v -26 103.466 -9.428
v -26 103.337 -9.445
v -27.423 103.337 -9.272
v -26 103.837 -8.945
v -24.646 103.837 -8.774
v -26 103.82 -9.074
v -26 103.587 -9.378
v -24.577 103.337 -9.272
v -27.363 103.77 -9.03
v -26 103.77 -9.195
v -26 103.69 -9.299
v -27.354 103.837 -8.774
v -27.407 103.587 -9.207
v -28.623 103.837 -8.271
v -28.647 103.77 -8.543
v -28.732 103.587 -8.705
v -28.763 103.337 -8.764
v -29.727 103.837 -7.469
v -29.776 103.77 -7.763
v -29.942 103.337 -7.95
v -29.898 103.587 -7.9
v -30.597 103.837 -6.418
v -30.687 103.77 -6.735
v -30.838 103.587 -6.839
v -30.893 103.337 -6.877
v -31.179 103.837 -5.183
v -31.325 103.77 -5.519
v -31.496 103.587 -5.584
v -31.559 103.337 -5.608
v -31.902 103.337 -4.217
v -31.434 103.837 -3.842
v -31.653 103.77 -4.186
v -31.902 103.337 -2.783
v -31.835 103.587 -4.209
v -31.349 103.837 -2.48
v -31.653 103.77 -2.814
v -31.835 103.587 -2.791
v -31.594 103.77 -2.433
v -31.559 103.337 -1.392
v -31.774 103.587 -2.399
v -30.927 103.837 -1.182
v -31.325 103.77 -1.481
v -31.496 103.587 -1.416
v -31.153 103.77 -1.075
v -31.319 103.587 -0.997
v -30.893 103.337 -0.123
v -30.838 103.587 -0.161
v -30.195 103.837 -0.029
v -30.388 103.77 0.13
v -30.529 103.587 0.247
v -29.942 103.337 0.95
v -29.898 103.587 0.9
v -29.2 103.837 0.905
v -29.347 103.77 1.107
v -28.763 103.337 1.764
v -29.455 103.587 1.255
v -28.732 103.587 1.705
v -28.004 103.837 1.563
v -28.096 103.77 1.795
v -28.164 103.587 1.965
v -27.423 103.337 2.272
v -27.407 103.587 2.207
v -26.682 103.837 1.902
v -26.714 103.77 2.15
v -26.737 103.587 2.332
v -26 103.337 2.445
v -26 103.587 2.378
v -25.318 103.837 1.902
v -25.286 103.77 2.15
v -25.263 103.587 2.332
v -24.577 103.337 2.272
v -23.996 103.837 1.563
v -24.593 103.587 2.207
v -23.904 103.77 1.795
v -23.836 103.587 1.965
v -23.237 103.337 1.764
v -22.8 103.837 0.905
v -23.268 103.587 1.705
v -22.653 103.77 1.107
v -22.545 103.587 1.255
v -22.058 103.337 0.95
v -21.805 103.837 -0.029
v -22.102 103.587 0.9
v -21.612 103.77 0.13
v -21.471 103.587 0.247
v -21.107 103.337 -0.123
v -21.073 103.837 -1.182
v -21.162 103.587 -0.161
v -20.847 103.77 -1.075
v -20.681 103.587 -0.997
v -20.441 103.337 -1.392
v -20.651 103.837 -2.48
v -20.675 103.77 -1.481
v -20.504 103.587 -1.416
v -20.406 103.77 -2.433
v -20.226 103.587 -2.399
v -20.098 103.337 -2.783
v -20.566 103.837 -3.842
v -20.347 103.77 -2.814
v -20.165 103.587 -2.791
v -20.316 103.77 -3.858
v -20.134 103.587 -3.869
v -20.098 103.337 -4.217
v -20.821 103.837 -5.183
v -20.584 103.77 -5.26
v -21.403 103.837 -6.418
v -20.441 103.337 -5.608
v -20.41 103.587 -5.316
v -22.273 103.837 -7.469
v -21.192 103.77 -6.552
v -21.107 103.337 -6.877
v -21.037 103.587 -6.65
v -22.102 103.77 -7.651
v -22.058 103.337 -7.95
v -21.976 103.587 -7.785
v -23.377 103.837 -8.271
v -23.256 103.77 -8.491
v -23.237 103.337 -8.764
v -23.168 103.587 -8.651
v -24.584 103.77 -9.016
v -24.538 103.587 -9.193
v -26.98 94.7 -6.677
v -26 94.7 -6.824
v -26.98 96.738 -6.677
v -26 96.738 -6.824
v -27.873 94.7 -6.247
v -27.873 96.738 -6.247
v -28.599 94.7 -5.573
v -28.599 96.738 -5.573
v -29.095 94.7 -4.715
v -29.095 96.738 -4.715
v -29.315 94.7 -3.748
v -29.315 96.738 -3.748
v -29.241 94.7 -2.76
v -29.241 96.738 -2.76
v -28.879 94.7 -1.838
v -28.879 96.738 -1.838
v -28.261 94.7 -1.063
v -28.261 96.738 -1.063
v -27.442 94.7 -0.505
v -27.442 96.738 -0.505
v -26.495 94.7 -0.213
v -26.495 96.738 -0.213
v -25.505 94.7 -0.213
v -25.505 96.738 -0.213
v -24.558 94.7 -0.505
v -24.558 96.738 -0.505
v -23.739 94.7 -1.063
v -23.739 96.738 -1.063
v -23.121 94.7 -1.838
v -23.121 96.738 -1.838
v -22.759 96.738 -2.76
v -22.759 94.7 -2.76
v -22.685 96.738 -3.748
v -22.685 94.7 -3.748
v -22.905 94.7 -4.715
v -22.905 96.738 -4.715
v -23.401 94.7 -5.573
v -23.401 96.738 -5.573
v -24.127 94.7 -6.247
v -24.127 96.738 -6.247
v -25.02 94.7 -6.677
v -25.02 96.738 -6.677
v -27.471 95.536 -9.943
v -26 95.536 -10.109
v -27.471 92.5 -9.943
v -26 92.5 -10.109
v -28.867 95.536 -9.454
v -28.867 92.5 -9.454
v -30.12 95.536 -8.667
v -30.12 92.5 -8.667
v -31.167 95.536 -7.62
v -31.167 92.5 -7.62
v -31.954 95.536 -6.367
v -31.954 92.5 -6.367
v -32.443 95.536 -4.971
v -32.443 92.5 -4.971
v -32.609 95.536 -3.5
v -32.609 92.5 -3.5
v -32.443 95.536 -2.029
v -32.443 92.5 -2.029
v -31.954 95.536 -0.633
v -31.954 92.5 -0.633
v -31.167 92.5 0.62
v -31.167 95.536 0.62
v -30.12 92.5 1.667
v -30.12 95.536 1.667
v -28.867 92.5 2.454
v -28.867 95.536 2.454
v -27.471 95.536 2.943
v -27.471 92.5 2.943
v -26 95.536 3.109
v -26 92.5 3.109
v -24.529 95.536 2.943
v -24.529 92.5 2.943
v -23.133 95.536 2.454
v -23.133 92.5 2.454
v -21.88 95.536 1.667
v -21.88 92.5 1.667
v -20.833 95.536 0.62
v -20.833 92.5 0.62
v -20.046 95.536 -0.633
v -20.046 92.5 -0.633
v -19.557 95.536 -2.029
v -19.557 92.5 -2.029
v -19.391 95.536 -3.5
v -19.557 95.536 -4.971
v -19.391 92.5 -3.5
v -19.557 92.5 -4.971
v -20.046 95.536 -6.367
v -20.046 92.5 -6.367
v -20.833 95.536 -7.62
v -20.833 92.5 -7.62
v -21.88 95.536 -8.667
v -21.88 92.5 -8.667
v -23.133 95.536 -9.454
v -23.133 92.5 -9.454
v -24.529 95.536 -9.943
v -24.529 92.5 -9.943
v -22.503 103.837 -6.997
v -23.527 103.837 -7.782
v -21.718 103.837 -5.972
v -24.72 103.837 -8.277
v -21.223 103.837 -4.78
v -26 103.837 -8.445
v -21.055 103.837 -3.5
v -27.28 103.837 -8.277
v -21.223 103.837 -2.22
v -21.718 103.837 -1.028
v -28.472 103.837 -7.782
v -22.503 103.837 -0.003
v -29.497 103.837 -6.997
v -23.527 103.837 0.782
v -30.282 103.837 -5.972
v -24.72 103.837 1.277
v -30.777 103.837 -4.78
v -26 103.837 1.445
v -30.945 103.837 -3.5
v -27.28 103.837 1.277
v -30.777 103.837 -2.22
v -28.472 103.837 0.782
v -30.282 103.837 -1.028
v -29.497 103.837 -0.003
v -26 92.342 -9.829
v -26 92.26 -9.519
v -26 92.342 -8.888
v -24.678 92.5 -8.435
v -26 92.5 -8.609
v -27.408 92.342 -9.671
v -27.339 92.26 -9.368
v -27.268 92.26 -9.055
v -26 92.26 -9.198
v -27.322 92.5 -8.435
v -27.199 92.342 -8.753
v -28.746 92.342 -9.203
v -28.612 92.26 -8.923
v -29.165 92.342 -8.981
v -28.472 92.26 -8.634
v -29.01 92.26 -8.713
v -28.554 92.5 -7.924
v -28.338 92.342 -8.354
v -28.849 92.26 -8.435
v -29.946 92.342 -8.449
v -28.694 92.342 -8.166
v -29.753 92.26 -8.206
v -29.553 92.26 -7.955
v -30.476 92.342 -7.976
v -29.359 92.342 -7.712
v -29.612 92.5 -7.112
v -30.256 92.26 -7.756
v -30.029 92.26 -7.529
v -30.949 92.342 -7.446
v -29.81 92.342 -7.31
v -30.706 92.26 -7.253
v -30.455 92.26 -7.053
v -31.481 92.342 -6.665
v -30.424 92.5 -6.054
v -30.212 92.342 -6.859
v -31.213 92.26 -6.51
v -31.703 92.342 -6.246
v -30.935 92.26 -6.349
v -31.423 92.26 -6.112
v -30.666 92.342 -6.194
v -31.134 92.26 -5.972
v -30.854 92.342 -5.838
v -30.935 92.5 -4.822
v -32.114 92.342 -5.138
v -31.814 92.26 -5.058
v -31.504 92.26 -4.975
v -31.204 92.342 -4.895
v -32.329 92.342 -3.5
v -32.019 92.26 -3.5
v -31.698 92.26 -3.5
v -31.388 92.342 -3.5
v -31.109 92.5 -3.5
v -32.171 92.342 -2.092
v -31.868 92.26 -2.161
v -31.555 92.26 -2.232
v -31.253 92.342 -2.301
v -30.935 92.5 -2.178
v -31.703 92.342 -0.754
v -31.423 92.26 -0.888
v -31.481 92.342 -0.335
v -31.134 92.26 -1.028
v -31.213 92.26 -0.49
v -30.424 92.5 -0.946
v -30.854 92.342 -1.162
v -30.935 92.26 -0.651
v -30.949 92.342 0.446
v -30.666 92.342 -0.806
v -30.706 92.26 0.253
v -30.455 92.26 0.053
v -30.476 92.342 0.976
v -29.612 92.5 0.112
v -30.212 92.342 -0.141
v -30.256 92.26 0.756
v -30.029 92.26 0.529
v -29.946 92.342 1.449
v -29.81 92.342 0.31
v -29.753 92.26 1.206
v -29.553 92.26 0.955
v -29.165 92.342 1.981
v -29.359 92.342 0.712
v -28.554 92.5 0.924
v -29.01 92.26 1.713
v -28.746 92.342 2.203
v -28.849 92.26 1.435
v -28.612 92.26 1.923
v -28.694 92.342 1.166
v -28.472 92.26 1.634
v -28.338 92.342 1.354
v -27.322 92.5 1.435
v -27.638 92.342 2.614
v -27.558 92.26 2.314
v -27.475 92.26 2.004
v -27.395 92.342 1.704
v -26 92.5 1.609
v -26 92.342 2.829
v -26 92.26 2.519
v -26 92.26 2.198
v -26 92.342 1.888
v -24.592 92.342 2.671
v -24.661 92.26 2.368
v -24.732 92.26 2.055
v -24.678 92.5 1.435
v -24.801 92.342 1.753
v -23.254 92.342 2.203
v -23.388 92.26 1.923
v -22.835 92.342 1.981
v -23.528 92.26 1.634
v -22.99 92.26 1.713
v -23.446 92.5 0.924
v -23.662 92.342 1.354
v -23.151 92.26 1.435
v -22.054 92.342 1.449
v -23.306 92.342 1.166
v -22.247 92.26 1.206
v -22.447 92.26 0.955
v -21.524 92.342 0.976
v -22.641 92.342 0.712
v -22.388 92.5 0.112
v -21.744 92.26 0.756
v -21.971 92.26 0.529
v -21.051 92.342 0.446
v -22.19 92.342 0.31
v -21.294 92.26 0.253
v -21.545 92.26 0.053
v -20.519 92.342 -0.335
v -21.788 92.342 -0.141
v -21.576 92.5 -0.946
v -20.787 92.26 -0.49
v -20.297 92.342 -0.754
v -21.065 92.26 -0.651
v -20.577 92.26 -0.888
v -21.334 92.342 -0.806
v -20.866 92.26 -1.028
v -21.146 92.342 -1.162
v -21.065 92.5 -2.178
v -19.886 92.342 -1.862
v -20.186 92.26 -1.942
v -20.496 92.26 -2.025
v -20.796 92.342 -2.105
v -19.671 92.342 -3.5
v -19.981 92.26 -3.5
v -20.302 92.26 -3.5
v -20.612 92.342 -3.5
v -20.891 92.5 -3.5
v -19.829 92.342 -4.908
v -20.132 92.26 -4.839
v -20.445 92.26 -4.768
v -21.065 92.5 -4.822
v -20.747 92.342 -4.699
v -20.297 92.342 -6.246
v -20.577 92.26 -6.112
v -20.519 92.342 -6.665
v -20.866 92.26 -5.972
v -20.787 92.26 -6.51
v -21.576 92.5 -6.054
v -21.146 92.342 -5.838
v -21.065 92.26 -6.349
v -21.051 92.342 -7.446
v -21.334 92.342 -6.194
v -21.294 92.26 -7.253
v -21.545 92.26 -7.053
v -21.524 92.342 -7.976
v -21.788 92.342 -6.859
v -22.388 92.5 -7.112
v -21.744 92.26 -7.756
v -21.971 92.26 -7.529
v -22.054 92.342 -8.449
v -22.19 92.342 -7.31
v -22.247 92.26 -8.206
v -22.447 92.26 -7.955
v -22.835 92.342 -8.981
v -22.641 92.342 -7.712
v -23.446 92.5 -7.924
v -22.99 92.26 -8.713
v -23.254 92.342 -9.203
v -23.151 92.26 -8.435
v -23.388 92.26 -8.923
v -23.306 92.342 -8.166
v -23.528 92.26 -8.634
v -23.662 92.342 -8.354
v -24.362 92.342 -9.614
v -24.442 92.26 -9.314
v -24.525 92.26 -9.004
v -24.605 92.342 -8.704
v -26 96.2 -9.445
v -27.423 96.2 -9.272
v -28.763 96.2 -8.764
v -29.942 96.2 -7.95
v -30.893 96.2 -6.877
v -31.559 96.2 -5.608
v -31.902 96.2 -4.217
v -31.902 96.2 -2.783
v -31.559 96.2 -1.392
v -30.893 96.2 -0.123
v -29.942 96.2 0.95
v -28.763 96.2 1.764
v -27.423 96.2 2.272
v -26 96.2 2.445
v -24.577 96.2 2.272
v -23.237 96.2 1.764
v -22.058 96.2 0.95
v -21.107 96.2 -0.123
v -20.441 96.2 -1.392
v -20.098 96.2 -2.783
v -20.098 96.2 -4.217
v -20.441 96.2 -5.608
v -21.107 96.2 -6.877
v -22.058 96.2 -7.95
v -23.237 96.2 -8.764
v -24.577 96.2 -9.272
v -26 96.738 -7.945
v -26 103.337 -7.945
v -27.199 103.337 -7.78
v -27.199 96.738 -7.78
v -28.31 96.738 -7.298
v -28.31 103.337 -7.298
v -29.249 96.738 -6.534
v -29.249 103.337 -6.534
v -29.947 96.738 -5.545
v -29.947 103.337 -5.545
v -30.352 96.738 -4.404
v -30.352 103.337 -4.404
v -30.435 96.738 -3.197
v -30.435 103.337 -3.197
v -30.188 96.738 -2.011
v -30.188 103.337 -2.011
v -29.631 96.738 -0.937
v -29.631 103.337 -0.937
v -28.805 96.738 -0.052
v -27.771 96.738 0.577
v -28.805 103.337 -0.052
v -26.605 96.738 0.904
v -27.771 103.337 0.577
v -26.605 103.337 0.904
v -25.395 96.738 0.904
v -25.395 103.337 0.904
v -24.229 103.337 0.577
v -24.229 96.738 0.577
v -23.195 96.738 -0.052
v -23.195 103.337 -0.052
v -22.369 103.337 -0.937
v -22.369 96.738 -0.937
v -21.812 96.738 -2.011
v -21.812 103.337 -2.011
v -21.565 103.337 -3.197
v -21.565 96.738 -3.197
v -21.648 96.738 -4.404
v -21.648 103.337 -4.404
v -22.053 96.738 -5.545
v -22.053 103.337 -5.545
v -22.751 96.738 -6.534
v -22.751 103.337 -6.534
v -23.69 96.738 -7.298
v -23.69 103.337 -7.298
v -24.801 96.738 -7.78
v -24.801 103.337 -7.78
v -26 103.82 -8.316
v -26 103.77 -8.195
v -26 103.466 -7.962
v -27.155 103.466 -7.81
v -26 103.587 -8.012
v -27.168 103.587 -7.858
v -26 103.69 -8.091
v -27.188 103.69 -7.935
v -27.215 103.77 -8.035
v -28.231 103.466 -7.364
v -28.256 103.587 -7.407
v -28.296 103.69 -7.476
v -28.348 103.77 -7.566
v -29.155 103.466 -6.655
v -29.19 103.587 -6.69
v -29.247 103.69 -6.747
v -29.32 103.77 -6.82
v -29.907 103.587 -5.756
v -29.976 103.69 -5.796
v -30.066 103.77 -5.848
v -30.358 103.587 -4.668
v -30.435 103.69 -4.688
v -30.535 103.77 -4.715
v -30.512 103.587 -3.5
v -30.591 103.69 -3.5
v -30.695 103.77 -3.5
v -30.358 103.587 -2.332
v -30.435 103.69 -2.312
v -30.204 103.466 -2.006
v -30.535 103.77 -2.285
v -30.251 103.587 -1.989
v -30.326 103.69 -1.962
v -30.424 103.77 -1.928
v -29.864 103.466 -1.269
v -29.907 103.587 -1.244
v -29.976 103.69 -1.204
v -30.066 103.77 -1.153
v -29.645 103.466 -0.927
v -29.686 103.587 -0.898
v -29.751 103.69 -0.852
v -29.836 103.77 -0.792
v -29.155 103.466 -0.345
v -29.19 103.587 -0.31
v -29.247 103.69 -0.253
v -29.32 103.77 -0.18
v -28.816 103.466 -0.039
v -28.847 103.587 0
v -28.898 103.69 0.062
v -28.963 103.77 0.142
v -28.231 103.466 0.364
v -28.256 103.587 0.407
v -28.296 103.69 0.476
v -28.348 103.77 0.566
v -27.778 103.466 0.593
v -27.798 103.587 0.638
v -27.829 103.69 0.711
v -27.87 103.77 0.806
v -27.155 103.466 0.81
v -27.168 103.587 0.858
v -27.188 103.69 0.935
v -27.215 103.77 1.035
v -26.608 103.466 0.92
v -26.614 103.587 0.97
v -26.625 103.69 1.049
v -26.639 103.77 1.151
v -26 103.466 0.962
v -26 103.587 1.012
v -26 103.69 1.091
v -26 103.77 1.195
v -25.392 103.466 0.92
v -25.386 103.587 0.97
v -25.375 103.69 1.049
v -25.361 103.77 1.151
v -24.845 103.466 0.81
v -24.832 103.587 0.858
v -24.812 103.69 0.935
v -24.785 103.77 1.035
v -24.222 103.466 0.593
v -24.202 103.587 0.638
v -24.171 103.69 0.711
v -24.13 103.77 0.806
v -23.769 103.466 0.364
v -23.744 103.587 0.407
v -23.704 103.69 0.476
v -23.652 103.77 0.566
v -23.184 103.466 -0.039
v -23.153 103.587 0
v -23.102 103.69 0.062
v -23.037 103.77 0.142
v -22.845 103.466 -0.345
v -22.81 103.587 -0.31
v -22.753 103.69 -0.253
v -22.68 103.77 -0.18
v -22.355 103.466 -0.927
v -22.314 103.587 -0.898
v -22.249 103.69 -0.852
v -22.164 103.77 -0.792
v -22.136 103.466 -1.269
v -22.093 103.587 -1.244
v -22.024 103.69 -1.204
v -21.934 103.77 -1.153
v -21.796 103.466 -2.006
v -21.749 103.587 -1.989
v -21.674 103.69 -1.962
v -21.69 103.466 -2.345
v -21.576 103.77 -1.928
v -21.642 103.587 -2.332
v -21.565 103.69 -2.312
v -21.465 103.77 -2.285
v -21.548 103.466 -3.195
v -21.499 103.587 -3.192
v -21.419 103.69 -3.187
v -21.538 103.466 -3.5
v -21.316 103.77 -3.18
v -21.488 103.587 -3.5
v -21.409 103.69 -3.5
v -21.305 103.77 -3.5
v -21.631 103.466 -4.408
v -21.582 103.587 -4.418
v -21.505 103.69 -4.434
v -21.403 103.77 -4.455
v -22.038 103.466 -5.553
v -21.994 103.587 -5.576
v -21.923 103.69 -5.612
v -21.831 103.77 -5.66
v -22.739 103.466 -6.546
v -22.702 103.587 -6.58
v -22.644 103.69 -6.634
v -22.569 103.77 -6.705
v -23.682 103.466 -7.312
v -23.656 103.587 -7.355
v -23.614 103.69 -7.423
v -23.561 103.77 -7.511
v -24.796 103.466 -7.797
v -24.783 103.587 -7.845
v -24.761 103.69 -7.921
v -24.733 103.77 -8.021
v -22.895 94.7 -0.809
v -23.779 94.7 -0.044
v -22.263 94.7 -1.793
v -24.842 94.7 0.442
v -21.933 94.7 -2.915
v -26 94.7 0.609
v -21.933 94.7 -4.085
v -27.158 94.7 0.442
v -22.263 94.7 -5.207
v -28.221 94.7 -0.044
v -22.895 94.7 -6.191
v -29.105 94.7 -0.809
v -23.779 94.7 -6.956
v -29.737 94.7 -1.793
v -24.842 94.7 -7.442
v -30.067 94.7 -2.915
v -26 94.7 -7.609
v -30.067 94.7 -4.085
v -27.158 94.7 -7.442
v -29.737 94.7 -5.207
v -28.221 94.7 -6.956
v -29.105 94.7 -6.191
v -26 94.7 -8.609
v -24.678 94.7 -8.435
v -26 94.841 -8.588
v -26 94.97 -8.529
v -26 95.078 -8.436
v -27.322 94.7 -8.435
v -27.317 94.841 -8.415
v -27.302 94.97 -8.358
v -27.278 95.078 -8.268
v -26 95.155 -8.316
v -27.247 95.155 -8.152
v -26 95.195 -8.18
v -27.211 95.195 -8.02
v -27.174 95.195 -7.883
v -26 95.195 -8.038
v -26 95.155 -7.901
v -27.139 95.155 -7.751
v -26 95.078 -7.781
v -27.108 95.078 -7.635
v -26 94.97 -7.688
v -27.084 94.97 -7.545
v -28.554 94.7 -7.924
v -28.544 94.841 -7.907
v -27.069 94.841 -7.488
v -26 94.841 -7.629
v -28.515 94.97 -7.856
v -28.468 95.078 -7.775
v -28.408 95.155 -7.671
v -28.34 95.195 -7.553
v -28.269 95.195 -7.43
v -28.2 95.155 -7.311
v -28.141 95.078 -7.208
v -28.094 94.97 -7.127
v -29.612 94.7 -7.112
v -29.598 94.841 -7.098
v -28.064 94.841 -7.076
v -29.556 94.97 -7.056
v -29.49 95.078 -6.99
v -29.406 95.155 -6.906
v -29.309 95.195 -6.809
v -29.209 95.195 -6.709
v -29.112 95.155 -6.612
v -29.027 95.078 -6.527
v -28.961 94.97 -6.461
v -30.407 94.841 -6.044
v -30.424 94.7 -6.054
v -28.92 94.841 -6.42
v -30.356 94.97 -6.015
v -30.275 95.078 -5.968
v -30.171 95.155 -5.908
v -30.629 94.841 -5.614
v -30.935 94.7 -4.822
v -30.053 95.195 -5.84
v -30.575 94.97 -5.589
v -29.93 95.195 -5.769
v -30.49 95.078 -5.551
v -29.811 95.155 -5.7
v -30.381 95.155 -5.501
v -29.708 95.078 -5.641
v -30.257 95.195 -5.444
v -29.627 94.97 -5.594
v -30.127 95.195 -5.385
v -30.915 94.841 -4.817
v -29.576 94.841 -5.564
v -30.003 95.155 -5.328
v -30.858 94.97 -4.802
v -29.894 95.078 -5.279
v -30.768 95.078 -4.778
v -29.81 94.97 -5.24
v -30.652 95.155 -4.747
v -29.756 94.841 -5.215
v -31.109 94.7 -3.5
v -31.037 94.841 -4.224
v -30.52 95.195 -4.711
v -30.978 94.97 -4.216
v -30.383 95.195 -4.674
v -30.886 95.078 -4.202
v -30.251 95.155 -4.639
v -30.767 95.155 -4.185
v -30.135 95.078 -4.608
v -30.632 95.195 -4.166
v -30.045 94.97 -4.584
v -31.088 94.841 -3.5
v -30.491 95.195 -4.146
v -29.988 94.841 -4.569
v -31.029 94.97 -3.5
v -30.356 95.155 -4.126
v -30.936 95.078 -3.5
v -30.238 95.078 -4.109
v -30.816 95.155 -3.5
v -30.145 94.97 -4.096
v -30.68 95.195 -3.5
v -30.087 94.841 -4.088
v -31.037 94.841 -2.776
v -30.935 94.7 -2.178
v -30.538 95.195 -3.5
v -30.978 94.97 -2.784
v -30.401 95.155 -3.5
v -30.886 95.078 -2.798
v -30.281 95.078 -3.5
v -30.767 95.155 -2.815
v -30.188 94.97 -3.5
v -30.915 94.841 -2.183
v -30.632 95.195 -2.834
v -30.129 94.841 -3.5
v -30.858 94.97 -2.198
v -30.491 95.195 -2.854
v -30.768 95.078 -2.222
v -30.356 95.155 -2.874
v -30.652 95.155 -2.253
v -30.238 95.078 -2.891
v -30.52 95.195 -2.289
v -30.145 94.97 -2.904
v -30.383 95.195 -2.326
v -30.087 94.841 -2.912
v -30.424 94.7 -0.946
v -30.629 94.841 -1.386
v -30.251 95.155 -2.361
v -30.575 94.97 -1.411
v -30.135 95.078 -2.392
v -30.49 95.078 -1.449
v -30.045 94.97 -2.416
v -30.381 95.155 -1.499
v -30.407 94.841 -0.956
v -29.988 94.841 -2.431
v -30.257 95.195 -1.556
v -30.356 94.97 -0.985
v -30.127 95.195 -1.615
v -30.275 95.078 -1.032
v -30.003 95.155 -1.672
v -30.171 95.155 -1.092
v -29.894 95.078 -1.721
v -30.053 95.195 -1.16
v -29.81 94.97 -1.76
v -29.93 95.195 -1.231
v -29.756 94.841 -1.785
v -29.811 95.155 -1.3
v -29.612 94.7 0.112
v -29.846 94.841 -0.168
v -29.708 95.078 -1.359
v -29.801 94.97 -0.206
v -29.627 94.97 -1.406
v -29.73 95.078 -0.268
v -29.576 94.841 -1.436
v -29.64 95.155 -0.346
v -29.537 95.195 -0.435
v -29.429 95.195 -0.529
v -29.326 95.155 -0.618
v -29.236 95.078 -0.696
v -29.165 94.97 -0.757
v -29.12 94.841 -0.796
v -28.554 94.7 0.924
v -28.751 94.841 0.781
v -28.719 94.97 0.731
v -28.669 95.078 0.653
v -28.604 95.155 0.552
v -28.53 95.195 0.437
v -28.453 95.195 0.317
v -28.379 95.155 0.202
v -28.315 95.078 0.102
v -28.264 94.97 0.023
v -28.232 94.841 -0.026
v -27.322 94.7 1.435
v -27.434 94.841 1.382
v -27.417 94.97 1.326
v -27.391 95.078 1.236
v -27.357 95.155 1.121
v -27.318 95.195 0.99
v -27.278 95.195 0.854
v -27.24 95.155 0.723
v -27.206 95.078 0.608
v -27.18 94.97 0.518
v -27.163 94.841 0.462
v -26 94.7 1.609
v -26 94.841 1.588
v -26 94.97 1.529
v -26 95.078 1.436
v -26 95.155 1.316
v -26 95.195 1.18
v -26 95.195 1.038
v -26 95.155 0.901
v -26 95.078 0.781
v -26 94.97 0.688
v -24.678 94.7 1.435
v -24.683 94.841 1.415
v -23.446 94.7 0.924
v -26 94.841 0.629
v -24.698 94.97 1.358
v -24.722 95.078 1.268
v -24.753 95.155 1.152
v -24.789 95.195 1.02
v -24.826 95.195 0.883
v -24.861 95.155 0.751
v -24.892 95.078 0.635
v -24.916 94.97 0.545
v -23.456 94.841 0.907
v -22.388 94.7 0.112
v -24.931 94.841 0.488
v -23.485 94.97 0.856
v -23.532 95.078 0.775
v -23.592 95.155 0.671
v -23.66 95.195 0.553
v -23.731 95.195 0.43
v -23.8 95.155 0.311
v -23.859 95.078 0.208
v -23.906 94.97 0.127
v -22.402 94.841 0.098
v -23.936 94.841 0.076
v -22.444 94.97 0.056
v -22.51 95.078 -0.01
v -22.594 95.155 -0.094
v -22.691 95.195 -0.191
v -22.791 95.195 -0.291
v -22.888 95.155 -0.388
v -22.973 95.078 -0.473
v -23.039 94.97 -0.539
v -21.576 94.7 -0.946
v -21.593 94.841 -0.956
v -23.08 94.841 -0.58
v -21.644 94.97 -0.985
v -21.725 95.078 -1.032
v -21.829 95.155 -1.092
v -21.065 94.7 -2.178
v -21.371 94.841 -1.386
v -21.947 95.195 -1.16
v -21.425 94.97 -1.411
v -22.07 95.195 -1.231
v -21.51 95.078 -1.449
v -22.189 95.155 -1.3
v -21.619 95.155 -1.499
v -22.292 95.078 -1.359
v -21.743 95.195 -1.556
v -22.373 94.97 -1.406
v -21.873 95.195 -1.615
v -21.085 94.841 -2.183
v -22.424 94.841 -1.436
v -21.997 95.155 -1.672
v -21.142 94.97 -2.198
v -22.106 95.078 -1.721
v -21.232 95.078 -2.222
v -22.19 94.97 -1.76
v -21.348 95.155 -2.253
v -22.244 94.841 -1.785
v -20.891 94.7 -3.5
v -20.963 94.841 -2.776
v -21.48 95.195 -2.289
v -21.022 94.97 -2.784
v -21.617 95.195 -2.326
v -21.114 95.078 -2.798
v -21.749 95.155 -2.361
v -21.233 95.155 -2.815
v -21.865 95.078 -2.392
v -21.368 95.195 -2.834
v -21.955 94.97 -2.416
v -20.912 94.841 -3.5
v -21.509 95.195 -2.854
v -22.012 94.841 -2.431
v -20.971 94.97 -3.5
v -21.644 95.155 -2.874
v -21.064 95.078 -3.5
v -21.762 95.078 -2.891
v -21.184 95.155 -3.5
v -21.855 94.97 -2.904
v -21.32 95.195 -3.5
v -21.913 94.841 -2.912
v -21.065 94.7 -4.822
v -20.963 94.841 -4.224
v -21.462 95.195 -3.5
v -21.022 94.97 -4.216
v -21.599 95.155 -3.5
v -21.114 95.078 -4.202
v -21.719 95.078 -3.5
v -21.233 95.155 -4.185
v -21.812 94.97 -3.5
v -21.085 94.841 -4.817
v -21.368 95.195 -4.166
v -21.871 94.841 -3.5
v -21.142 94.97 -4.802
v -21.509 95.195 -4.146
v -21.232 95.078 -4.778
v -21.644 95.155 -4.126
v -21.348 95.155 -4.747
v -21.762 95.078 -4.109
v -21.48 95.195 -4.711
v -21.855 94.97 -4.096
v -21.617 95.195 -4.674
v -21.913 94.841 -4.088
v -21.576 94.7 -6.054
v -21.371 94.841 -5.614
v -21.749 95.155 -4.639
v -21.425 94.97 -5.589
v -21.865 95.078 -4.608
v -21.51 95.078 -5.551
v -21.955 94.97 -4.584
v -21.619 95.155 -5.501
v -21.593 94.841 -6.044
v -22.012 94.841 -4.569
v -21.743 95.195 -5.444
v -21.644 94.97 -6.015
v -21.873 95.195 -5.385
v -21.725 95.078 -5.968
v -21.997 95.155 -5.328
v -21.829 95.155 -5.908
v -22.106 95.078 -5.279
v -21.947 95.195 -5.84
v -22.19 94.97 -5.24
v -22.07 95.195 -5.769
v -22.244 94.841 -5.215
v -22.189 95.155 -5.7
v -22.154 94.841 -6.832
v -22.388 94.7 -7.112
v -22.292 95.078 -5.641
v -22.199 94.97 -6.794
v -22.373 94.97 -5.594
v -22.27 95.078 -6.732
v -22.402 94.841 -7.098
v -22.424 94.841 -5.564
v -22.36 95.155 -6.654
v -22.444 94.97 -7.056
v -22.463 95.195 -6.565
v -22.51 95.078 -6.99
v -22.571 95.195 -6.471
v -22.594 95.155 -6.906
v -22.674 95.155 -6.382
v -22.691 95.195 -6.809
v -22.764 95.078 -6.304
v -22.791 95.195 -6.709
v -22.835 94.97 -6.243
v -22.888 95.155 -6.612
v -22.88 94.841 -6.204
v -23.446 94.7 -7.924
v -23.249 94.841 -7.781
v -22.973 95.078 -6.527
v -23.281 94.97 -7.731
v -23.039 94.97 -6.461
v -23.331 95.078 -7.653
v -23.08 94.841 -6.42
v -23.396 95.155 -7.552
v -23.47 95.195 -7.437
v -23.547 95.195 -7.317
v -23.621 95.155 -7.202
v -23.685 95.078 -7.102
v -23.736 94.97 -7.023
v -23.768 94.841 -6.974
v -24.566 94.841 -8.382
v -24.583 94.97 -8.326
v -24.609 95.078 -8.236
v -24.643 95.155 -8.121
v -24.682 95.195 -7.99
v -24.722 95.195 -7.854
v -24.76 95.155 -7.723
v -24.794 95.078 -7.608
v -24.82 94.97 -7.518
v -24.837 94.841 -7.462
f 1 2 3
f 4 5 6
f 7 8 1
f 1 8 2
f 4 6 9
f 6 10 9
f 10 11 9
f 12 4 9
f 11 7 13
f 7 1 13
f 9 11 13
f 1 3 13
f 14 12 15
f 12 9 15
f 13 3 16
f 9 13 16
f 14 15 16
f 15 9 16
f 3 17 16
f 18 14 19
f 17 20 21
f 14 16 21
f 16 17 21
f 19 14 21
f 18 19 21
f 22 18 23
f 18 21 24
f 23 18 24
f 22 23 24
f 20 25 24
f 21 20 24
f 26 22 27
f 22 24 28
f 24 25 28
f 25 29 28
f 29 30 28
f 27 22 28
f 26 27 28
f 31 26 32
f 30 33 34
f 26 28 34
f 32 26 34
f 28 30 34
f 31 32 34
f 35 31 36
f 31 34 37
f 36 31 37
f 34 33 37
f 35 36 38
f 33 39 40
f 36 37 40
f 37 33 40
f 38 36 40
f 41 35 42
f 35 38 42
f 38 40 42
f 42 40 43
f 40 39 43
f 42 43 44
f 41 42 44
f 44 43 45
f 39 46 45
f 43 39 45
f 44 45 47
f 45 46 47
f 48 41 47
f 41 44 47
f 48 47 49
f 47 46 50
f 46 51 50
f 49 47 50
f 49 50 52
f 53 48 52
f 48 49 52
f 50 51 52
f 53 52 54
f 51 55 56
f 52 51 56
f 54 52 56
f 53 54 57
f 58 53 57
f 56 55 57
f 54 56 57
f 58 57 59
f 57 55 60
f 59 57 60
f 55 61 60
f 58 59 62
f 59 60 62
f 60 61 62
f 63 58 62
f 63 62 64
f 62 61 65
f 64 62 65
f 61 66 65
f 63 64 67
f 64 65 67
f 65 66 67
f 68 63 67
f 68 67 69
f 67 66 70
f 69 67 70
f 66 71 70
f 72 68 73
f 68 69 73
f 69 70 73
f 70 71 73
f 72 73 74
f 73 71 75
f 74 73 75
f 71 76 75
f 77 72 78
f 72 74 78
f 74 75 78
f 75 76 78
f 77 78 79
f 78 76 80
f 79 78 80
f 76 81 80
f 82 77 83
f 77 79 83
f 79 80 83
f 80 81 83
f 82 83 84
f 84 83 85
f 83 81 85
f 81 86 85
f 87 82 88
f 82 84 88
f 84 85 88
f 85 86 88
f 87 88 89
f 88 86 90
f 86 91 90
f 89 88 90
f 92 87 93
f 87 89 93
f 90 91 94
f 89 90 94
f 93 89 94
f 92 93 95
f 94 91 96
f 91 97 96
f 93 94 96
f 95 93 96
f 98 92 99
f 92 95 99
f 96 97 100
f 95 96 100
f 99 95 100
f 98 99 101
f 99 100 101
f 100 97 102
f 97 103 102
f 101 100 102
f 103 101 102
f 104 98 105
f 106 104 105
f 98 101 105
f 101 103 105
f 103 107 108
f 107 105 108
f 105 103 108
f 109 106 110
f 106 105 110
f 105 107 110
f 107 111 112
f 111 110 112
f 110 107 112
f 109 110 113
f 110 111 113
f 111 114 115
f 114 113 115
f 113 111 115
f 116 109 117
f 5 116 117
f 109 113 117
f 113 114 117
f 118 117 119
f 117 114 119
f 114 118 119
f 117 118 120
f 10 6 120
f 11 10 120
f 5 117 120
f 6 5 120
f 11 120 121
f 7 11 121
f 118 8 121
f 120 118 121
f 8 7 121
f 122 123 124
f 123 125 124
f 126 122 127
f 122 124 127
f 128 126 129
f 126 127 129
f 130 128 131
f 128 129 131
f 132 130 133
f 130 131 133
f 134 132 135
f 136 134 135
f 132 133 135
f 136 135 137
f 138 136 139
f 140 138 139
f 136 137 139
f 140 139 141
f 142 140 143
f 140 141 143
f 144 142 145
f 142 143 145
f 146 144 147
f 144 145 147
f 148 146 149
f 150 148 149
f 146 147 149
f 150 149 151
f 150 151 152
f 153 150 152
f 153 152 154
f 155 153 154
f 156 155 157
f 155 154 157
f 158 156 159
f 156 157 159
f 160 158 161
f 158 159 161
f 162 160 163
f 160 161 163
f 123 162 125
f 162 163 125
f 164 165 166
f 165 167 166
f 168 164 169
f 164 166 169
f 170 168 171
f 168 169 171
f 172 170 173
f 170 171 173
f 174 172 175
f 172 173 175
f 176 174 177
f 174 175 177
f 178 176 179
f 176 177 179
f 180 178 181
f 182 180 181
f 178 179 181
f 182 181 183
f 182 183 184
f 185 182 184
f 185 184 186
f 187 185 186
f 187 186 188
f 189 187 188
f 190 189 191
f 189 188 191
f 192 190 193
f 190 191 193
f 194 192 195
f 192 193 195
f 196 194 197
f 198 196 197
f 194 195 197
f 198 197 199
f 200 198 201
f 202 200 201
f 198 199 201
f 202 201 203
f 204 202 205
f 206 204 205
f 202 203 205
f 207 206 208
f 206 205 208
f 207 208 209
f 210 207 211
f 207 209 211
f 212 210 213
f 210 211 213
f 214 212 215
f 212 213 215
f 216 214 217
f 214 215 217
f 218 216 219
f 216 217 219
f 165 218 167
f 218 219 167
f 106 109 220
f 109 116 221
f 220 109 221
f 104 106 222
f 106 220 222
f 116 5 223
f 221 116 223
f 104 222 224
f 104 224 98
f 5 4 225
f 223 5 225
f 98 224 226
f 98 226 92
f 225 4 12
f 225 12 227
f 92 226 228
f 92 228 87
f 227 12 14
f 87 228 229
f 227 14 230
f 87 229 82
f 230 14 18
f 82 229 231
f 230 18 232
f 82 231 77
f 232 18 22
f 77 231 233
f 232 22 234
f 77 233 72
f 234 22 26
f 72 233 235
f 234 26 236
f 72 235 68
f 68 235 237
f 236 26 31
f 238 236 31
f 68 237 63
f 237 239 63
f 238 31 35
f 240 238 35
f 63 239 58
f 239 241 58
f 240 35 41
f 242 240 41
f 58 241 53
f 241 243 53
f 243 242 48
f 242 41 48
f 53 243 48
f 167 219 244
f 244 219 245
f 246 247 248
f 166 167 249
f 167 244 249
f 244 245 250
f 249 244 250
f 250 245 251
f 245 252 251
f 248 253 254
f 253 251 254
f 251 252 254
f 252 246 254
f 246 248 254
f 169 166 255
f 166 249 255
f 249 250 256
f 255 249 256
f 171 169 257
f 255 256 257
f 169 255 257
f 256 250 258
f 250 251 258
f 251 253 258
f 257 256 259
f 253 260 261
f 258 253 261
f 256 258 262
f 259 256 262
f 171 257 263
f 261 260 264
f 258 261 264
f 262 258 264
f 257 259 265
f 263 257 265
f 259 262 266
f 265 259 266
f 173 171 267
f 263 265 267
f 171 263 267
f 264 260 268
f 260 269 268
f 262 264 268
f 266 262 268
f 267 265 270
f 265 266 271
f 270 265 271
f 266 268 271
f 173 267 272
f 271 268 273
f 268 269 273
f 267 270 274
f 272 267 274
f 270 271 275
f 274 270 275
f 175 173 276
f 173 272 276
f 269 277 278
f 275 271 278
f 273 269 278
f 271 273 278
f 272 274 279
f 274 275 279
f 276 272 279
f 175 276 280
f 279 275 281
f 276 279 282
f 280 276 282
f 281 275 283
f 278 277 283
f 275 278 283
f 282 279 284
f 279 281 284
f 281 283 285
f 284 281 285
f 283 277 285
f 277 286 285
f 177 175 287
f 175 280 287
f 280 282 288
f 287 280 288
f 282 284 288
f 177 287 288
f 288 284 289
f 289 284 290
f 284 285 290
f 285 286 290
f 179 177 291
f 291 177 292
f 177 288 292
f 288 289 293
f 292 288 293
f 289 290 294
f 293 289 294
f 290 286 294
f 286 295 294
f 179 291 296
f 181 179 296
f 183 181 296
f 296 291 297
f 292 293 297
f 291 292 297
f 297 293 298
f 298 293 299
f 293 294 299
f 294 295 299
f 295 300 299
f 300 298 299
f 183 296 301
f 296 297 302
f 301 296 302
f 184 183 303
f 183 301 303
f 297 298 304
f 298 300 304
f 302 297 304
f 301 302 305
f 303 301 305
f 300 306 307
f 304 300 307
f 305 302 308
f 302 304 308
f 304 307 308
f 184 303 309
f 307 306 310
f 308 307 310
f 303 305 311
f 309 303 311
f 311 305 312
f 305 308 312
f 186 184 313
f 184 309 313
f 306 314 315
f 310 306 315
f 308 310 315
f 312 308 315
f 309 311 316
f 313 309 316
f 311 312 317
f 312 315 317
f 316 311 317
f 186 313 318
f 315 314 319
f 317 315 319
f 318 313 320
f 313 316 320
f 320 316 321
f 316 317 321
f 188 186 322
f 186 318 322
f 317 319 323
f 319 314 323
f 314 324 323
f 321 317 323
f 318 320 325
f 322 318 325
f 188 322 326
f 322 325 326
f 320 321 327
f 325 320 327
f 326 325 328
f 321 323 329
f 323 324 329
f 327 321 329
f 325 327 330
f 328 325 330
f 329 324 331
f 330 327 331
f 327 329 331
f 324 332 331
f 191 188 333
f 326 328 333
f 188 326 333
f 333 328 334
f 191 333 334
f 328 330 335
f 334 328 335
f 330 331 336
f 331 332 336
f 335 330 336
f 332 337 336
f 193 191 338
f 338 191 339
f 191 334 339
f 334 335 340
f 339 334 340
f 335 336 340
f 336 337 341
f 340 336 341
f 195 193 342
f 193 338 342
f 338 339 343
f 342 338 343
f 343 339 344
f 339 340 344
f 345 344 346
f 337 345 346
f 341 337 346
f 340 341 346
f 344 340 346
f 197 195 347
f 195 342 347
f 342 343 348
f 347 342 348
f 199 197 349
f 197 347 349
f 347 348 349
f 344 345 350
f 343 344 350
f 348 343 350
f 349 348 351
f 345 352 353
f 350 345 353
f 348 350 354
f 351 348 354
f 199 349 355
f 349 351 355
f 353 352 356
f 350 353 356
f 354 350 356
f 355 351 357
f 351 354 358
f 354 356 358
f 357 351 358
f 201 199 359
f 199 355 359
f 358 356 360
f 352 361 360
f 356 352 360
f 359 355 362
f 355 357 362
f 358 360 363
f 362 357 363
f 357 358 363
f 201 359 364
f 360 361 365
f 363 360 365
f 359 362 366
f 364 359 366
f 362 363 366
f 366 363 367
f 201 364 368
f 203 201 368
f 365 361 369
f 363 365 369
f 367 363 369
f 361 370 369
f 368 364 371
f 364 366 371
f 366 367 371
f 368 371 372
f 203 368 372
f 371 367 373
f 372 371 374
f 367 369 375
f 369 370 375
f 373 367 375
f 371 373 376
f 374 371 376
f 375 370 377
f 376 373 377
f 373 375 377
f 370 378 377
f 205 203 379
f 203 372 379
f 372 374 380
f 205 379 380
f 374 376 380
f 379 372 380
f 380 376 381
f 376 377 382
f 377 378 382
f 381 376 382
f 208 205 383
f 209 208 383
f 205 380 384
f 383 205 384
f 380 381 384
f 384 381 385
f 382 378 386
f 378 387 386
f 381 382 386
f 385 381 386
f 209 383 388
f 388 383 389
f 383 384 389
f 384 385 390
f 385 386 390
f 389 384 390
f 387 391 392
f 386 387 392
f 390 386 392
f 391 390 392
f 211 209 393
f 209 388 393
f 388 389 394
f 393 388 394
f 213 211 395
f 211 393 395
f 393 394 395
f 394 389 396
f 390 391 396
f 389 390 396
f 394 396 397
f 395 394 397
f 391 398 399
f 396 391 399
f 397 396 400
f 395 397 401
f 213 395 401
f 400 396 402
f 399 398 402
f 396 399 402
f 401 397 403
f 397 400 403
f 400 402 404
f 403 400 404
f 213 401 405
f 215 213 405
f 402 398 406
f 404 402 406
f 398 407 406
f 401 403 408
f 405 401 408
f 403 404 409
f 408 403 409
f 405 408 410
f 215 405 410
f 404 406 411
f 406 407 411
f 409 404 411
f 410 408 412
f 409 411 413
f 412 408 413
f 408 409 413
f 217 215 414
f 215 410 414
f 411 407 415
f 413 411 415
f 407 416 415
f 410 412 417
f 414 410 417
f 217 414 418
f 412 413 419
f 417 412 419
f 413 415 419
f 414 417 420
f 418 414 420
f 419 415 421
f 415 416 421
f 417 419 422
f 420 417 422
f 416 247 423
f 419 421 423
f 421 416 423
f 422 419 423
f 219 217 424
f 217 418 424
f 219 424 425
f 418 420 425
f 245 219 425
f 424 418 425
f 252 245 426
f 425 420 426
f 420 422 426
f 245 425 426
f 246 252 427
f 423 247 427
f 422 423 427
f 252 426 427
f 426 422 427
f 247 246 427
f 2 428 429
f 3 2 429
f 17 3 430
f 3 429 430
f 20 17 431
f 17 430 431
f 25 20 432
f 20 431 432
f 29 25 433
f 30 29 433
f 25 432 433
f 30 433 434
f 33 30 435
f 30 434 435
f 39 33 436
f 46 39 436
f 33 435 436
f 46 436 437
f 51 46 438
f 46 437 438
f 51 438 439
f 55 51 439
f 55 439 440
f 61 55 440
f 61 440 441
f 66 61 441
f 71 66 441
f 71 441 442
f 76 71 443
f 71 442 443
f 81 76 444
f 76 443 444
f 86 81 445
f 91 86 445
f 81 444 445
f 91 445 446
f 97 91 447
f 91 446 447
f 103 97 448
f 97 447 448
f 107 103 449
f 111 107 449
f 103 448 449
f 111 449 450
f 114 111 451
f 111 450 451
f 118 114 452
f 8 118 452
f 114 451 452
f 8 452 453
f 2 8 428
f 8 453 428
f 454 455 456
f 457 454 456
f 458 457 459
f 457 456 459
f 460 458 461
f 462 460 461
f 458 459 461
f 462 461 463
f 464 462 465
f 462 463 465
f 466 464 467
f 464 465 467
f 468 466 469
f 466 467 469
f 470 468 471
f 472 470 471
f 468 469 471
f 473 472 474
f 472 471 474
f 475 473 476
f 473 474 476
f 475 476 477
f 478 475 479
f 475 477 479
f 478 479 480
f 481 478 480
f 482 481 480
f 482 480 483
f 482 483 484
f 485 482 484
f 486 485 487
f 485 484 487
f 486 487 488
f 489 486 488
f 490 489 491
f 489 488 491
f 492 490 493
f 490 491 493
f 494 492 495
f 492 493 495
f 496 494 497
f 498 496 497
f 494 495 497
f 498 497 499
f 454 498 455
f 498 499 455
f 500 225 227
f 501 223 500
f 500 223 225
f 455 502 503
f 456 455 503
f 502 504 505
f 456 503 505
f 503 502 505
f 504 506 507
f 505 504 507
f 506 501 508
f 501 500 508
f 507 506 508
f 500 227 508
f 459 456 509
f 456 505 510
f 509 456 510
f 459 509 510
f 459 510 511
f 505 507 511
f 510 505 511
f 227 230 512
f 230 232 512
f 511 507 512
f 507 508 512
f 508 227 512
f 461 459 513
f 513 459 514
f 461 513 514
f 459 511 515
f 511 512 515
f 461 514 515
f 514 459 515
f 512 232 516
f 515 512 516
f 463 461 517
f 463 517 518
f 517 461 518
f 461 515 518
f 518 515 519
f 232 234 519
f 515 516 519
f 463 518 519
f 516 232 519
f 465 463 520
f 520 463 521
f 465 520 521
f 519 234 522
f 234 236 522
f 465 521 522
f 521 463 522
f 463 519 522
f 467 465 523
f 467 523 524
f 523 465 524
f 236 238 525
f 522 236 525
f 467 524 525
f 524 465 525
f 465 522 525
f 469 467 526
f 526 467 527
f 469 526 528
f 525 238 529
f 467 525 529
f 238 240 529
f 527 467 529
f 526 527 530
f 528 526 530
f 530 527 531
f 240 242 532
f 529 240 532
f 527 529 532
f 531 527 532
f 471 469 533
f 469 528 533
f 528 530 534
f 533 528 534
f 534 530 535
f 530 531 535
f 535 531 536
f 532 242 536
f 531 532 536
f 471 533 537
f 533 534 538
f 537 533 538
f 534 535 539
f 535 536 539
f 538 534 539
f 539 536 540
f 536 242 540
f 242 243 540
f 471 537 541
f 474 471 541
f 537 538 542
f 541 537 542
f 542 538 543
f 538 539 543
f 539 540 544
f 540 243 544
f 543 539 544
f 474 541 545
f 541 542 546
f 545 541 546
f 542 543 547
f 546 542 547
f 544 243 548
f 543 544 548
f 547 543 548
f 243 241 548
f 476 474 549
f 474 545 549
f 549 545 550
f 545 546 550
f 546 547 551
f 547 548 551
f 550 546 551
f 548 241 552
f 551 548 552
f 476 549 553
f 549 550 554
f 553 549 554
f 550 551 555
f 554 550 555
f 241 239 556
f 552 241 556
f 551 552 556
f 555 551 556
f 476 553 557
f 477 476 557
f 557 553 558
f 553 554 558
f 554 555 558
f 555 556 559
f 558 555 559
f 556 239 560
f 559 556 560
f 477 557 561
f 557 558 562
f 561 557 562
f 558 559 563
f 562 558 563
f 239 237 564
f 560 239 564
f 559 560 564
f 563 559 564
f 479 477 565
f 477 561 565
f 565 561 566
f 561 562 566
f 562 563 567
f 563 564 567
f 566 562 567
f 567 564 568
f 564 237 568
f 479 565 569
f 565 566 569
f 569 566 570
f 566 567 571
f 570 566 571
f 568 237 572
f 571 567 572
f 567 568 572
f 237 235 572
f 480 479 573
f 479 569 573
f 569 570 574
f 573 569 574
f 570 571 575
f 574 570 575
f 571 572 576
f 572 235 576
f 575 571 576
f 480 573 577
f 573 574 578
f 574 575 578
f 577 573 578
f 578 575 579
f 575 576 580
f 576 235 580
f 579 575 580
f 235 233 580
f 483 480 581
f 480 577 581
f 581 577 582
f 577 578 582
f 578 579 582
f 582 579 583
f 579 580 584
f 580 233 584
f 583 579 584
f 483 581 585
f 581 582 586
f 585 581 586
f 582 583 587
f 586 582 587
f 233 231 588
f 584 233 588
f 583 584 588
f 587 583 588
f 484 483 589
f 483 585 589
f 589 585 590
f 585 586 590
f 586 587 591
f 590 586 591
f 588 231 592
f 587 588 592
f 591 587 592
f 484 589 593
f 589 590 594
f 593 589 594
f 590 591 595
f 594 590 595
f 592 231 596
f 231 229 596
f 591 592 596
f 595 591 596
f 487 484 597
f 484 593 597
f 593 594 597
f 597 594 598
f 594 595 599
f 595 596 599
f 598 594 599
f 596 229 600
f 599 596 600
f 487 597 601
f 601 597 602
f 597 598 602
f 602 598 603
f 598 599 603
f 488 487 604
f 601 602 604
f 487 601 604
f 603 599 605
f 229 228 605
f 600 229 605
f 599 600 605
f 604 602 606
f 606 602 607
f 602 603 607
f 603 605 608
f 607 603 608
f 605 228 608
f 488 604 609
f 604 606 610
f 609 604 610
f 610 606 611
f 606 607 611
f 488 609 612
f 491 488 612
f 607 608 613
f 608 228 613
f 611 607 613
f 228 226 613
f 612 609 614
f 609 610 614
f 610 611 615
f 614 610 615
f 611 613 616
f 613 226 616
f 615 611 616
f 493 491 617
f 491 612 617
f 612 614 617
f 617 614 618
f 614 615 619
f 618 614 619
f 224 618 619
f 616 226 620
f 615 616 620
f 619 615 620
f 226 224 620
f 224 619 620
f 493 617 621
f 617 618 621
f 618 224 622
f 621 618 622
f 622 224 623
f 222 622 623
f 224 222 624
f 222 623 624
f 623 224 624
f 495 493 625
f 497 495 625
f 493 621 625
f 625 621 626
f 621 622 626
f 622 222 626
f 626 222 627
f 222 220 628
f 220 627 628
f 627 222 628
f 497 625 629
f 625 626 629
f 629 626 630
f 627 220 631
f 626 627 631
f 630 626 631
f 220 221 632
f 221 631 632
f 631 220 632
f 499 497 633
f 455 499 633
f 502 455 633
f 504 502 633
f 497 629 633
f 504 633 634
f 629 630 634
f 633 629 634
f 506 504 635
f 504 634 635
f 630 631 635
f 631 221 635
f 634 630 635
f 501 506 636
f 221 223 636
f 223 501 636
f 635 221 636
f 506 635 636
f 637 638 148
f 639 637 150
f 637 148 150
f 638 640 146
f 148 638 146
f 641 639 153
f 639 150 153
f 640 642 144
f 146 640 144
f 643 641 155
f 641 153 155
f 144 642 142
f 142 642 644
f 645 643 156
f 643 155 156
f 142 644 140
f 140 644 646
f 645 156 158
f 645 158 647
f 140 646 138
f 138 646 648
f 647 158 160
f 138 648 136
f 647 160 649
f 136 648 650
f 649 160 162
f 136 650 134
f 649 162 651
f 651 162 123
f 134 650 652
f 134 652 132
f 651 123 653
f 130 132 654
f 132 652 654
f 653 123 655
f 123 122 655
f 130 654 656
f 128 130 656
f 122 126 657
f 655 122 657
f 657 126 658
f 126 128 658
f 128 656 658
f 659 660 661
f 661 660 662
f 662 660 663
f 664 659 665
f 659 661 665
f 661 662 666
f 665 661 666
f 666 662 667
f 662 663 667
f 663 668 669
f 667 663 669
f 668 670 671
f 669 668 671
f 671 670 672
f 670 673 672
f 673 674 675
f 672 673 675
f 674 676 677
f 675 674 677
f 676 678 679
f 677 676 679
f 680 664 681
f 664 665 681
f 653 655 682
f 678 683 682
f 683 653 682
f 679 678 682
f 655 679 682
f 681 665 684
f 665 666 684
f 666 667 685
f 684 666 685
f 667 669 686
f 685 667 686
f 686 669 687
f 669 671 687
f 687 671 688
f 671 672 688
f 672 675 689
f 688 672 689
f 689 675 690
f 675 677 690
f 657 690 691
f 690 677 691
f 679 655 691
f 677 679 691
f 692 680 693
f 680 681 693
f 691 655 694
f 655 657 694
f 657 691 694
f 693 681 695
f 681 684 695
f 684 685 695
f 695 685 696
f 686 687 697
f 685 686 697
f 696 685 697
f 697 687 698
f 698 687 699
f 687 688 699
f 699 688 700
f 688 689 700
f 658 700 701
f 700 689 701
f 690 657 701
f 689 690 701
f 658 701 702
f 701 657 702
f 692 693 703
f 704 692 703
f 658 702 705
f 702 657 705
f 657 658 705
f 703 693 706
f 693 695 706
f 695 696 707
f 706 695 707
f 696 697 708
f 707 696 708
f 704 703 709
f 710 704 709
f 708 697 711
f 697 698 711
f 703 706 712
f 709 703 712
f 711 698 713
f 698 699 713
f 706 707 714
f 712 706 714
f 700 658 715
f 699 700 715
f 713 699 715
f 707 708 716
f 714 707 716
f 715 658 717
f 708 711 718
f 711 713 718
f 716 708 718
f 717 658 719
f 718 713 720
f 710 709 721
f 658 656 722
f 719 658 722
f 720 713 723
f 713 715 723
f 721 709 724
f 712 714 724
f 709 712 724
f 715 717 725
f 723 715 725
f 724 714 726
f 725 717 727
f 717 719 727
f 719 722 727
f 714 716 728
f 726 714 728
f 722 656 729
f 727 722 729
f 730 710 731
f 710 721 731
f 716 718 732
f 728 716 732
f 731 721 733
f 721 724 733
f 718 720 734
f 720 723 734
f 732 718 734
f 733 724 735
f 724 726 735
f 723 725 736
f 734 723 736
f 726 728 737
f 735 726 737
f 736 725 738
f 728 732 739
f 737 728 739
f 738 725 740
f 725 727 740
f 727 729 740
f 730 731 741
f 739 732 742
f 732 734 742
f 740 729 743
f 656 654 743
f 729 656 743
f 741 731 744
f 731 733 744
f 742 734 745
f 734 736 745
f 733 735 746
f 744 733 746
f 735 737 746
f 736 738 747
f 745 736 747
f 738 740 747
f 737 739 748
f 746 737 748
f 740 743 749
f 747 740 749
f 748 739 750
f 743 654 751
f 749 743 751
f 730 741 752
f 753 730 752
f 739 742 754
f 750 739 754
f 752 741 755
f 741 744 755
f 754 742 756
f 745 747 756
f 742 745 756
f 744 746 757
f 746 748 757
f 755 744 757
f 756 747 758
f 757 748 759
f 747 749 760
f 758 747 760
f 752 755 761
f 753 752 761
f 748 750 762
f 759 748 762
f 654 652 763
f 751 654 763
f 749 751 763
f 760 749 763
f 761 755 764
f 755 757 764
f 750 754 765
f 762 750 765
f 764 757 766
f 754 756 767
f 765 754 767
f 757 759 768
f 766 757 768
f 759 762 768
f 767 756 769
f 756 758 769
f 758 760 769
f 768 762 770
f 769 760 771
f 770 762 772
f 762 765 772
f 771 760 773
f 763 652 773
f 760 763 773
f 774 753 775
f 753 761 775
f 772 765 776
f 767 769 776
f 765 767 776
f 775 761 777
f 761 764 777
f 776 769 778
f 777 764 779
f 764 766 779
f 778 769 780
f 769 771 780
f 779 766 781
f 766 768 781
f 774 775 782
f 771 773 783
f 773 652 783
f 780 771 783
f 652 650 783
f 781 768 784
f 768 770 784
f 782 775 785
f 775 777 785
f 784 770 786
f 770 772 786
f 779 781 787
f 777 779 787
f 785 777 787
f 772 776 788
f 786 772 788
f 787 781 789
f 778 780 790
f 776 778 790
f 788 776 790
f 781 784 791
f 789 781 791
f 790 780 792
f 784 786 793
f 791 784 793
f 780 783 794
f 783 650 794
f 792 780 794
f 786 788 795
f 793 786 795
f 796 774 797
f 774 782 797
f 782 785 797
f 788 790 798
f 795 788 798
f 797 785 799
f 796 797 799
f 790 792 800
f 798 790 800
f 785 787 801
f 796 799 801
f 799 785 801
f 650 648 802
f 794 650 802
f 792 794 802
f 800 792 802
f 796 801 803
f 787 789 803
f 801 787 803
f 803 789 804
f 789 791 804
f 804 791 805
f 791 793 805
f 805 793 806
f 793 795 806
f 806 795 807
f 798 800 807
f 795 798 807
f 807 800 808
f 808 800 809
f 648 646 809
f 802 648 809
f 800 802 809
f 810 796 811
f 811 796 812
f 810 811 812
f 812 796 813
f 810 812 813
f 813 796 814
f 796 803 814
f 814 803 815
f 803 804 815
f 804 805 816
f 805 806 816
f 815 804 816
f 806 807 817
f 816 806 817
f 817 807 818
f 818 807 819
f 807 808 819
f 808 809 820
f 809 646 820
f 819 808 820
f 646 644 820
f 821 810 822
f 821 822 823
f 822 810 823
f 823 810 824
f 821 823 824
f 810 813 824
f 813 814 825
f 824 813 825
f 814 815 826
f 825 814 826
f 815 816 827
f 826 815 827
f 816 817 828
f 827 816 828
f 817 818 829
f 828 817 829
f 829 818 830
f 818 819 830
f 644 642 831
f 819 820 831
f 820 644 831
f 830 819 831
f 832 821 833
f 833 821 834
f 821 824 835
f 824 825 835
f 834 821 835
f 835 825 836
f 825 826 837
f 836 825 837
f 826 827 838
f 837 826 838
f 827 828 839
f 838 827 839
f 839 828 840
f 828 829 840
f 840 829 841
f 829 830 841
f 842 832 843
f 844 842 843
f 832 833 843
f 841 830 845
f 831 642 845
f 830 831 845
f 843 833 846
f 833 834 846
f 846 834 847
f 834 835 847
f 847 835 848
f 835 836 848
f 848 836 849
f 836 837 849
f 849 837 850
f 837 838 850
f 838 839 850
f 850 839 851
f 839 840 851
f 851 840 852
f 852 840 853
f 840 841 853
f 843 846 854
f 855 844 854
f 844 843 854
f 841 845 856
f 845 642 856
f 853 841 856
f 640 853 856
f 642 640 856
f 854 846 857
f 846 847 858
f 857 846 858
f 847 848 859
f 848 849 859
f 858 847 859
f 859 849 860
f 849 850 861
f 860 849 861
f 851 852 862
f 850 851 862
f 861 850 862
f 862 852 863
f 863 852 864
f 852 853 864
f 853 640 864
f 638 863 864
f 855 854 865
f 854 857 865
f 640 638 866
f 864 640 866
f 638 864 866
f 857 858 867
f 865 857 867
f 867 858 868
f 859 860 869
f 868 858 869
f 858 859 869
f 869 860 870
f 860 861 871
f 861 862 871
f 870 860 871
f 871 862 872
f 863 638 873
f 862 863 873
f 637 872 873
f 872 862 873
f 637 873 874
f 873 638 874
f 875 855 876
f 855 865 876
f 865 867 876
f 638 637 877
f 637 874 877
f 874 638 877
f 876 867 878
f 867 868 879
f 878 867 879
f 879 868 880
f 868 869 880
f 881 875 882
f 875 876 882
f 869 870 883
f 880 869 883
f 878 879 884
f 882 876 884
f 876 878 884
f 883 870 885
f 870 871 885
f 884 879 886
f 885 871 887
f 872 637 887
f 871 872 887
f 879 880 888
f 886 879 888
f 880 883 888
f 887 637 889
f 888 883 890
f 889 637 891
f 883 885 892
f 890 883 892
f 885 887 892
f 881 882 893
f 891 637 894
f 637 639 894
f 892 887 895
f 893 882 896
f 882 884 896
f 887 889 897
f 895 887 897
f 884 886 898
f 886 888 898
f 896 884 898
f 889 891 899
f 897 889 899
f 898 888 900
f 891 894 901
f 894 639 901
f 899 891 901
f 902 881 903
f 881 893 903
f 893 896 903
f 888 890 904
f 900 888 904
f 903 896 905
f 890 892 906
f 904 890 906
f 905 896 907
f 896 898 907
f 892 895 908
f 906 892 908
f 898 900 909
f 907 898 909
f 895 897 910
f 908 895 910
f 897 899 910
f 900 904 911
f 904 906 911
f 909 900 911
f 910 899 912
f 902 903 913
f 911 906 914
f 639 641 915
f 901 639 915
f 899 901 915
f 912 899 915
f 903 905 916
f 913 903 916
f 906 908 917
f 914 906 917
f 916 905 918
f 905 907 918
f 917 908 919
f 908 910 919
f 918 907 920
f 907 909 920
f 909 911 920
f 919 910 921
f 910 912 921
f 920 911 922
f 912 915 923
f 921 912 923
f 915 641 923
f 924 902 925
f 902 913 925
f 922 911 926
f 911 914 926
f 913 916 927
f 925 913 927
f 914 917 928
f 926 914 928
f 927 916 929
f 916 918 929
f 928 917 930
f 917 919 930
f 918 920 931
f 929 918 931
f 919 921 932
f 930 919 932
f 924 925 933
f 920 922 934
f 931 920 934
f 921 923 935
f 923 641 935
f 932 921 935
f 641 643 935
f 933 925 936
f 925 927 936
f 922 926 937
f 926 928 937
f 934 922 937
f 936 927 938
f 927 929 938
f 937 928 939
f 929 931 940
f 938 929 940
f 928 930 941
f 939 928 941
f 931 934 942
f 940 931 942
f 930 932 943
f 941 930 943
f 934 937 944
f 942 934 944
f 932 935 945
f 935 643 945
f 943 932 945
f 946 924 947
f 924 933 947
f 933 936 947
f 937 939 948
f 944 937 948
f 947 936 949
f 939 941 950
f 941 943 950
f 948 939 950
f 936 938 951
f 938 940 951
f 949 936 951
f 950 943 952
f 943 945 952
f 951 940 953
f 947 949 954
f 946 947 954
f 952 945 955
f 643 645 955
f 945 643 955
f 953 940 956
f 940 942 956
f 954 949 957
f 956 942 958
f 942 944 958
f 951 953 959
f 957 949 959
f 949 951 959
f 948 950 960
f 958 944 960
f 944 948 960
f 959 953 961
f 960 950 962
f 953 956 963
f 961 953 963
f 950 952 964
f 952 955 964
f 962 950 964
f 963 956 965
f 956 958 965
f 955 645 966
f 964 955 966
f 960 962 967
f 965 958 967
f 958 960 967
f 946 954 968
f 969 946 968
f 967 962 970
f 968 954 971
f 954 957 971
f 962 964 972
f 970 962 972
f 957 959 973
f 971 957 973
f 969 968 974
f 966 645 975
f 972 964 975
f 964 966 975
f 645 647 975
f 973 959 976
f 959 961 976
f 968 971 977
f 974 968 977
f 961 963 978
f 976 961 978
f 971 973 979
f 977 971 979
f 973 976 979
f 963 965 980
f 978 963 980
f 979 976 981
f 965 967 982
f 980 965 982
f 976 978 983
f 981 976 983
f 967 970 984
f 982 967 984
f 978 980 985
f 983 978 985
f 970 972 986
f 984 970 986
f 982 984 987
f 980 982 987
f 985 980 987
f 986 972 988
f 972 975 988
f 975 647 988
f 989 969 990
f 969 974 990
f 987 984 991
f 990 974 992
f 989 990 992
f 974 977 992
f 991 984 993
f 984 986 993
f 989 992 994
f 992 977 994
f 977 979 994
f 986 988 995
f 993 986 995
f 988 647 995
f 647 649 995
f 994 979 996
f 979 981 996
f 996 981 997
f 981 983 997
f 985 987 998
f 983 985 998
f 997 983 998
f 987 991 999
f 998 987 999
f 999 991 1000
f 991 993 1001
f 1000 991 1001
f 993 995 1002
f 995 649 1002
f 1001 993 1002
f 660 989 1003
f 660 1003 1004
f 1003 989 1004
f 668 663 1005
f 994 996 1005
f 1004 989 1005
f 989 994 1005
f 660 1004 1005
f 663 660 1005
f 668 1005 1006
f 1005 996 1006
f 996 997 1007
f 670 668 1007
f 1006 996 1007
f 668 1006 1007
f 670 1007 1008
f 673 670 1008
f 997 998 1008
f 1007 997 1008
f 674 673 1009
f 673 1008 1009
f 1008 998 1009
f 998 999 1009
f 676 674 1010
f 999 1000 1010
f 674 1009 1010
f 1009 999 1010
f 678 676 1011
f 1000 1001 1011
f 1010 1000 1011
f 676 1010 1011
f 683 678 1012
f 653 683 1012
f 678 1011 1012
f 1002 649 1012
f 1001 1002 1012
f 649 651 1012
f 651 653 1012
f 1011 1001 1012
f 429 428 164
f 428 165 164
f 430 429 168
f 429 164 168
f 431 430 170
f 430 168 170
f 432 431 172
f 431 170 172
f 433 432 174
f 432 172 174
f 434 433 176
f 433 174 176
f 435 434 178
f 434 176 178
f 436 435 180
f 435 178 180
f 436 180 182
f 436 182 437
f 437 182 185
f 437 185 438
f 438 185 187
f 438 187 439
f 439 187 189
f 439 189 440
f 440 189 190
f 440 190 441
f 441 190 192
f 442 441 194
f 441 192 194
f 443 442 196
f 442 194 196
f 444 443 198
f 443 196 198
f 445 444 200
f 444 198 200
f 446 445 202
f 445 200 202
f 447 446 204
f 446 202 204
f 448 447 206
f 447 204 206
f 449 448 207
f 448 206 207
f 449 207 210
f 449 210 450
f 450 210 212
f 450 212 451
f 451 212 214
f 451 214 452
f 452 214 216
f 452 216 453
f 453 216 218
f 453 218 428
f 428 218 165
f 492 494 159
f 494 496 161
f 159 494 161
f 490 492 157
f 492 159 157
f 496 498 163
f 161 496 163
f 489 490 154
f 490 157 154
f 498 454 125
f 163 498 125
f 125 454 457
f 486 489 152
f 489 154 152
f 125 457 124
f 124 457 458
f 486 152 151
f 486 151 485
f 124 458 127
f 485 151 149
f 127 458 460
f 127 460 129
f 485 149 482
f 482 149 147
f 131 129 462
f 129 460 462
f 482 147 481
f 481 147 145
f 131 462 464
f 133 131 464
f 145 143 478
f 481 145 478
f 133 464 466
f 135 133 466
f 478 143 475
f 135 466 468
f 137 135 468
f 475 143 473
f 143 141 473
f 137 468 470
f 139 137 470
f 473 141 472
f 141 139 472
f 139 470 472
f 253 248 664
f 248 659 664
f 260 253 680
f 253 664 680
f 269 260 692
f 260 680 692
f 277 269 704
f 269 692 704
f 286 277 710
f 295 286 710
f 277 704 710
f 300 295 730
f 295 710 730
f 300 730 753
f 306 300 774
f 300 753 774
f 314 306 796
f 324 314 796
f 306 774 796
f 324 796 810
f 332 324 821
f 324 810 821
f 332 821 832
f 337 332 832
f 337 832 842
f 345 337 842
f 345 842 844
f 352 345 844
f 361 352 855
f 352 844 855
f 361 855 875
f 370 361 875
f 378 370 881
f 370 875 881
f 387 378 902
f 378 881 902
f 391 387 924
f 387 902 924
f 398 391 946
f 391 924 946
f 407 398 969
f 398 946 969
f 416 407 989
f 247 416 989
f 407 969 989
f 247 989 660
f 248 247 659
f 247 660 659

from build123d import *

# Parameters (mm, degrees)
FILLET1_R = 0.5


with BuildPart() as part:
    # Sketch2 → Revolve1 (revolve)
    with BuildSketch(Plane.XY.offset(-3.5)):
        with BuildLine():
            ThreePointArc((-21.891294302, 94.7), (-21.391294302, 95.2), (-20.891294302, 94.7))
            Line((-20.891294302, 94.7), (-20.891294302, 92.5))
            ThreePointArc((-20.891294302, 92.5), (-20.141294302, 92.25), (-19.391294302, 92.5))
            Line((-19.391294302, 92.5), (-19.391294302, 95.536294302))
            Line((-19.391294302, 95.536294302), (-20.055, 96.2))
            Line((-20.055, 96.2), (-20.055, 103.8368))
            Line((-20.055, 103.8368), (-21.555, 103.8368))
            Line((-21.555, 103.8368), (-21.555, 96.7375))
            Line((-21.555, 96.7375), (-22.675639033, 96.7375))
            Line((-22.675639033, 96.7375), (-22.675639033, 94.7))
            Line((-22.675639033, 94.7), (-21.891294302, 94.7))
        make_face()
    revolve(axis=Axis((-26, 90.5, -3.5), (0, 1, 0)))

    # Fillet1
    fillet1_edges = [part.edges().sort_by_distance(p)[0] for p in [
        (-30.445, 103.8368, -3.5),
        (-31.945, 103.8368, -3.5),
    ]]
    fillet(fillet1_edges, radius=FILLET1_R)


solid = part.part
